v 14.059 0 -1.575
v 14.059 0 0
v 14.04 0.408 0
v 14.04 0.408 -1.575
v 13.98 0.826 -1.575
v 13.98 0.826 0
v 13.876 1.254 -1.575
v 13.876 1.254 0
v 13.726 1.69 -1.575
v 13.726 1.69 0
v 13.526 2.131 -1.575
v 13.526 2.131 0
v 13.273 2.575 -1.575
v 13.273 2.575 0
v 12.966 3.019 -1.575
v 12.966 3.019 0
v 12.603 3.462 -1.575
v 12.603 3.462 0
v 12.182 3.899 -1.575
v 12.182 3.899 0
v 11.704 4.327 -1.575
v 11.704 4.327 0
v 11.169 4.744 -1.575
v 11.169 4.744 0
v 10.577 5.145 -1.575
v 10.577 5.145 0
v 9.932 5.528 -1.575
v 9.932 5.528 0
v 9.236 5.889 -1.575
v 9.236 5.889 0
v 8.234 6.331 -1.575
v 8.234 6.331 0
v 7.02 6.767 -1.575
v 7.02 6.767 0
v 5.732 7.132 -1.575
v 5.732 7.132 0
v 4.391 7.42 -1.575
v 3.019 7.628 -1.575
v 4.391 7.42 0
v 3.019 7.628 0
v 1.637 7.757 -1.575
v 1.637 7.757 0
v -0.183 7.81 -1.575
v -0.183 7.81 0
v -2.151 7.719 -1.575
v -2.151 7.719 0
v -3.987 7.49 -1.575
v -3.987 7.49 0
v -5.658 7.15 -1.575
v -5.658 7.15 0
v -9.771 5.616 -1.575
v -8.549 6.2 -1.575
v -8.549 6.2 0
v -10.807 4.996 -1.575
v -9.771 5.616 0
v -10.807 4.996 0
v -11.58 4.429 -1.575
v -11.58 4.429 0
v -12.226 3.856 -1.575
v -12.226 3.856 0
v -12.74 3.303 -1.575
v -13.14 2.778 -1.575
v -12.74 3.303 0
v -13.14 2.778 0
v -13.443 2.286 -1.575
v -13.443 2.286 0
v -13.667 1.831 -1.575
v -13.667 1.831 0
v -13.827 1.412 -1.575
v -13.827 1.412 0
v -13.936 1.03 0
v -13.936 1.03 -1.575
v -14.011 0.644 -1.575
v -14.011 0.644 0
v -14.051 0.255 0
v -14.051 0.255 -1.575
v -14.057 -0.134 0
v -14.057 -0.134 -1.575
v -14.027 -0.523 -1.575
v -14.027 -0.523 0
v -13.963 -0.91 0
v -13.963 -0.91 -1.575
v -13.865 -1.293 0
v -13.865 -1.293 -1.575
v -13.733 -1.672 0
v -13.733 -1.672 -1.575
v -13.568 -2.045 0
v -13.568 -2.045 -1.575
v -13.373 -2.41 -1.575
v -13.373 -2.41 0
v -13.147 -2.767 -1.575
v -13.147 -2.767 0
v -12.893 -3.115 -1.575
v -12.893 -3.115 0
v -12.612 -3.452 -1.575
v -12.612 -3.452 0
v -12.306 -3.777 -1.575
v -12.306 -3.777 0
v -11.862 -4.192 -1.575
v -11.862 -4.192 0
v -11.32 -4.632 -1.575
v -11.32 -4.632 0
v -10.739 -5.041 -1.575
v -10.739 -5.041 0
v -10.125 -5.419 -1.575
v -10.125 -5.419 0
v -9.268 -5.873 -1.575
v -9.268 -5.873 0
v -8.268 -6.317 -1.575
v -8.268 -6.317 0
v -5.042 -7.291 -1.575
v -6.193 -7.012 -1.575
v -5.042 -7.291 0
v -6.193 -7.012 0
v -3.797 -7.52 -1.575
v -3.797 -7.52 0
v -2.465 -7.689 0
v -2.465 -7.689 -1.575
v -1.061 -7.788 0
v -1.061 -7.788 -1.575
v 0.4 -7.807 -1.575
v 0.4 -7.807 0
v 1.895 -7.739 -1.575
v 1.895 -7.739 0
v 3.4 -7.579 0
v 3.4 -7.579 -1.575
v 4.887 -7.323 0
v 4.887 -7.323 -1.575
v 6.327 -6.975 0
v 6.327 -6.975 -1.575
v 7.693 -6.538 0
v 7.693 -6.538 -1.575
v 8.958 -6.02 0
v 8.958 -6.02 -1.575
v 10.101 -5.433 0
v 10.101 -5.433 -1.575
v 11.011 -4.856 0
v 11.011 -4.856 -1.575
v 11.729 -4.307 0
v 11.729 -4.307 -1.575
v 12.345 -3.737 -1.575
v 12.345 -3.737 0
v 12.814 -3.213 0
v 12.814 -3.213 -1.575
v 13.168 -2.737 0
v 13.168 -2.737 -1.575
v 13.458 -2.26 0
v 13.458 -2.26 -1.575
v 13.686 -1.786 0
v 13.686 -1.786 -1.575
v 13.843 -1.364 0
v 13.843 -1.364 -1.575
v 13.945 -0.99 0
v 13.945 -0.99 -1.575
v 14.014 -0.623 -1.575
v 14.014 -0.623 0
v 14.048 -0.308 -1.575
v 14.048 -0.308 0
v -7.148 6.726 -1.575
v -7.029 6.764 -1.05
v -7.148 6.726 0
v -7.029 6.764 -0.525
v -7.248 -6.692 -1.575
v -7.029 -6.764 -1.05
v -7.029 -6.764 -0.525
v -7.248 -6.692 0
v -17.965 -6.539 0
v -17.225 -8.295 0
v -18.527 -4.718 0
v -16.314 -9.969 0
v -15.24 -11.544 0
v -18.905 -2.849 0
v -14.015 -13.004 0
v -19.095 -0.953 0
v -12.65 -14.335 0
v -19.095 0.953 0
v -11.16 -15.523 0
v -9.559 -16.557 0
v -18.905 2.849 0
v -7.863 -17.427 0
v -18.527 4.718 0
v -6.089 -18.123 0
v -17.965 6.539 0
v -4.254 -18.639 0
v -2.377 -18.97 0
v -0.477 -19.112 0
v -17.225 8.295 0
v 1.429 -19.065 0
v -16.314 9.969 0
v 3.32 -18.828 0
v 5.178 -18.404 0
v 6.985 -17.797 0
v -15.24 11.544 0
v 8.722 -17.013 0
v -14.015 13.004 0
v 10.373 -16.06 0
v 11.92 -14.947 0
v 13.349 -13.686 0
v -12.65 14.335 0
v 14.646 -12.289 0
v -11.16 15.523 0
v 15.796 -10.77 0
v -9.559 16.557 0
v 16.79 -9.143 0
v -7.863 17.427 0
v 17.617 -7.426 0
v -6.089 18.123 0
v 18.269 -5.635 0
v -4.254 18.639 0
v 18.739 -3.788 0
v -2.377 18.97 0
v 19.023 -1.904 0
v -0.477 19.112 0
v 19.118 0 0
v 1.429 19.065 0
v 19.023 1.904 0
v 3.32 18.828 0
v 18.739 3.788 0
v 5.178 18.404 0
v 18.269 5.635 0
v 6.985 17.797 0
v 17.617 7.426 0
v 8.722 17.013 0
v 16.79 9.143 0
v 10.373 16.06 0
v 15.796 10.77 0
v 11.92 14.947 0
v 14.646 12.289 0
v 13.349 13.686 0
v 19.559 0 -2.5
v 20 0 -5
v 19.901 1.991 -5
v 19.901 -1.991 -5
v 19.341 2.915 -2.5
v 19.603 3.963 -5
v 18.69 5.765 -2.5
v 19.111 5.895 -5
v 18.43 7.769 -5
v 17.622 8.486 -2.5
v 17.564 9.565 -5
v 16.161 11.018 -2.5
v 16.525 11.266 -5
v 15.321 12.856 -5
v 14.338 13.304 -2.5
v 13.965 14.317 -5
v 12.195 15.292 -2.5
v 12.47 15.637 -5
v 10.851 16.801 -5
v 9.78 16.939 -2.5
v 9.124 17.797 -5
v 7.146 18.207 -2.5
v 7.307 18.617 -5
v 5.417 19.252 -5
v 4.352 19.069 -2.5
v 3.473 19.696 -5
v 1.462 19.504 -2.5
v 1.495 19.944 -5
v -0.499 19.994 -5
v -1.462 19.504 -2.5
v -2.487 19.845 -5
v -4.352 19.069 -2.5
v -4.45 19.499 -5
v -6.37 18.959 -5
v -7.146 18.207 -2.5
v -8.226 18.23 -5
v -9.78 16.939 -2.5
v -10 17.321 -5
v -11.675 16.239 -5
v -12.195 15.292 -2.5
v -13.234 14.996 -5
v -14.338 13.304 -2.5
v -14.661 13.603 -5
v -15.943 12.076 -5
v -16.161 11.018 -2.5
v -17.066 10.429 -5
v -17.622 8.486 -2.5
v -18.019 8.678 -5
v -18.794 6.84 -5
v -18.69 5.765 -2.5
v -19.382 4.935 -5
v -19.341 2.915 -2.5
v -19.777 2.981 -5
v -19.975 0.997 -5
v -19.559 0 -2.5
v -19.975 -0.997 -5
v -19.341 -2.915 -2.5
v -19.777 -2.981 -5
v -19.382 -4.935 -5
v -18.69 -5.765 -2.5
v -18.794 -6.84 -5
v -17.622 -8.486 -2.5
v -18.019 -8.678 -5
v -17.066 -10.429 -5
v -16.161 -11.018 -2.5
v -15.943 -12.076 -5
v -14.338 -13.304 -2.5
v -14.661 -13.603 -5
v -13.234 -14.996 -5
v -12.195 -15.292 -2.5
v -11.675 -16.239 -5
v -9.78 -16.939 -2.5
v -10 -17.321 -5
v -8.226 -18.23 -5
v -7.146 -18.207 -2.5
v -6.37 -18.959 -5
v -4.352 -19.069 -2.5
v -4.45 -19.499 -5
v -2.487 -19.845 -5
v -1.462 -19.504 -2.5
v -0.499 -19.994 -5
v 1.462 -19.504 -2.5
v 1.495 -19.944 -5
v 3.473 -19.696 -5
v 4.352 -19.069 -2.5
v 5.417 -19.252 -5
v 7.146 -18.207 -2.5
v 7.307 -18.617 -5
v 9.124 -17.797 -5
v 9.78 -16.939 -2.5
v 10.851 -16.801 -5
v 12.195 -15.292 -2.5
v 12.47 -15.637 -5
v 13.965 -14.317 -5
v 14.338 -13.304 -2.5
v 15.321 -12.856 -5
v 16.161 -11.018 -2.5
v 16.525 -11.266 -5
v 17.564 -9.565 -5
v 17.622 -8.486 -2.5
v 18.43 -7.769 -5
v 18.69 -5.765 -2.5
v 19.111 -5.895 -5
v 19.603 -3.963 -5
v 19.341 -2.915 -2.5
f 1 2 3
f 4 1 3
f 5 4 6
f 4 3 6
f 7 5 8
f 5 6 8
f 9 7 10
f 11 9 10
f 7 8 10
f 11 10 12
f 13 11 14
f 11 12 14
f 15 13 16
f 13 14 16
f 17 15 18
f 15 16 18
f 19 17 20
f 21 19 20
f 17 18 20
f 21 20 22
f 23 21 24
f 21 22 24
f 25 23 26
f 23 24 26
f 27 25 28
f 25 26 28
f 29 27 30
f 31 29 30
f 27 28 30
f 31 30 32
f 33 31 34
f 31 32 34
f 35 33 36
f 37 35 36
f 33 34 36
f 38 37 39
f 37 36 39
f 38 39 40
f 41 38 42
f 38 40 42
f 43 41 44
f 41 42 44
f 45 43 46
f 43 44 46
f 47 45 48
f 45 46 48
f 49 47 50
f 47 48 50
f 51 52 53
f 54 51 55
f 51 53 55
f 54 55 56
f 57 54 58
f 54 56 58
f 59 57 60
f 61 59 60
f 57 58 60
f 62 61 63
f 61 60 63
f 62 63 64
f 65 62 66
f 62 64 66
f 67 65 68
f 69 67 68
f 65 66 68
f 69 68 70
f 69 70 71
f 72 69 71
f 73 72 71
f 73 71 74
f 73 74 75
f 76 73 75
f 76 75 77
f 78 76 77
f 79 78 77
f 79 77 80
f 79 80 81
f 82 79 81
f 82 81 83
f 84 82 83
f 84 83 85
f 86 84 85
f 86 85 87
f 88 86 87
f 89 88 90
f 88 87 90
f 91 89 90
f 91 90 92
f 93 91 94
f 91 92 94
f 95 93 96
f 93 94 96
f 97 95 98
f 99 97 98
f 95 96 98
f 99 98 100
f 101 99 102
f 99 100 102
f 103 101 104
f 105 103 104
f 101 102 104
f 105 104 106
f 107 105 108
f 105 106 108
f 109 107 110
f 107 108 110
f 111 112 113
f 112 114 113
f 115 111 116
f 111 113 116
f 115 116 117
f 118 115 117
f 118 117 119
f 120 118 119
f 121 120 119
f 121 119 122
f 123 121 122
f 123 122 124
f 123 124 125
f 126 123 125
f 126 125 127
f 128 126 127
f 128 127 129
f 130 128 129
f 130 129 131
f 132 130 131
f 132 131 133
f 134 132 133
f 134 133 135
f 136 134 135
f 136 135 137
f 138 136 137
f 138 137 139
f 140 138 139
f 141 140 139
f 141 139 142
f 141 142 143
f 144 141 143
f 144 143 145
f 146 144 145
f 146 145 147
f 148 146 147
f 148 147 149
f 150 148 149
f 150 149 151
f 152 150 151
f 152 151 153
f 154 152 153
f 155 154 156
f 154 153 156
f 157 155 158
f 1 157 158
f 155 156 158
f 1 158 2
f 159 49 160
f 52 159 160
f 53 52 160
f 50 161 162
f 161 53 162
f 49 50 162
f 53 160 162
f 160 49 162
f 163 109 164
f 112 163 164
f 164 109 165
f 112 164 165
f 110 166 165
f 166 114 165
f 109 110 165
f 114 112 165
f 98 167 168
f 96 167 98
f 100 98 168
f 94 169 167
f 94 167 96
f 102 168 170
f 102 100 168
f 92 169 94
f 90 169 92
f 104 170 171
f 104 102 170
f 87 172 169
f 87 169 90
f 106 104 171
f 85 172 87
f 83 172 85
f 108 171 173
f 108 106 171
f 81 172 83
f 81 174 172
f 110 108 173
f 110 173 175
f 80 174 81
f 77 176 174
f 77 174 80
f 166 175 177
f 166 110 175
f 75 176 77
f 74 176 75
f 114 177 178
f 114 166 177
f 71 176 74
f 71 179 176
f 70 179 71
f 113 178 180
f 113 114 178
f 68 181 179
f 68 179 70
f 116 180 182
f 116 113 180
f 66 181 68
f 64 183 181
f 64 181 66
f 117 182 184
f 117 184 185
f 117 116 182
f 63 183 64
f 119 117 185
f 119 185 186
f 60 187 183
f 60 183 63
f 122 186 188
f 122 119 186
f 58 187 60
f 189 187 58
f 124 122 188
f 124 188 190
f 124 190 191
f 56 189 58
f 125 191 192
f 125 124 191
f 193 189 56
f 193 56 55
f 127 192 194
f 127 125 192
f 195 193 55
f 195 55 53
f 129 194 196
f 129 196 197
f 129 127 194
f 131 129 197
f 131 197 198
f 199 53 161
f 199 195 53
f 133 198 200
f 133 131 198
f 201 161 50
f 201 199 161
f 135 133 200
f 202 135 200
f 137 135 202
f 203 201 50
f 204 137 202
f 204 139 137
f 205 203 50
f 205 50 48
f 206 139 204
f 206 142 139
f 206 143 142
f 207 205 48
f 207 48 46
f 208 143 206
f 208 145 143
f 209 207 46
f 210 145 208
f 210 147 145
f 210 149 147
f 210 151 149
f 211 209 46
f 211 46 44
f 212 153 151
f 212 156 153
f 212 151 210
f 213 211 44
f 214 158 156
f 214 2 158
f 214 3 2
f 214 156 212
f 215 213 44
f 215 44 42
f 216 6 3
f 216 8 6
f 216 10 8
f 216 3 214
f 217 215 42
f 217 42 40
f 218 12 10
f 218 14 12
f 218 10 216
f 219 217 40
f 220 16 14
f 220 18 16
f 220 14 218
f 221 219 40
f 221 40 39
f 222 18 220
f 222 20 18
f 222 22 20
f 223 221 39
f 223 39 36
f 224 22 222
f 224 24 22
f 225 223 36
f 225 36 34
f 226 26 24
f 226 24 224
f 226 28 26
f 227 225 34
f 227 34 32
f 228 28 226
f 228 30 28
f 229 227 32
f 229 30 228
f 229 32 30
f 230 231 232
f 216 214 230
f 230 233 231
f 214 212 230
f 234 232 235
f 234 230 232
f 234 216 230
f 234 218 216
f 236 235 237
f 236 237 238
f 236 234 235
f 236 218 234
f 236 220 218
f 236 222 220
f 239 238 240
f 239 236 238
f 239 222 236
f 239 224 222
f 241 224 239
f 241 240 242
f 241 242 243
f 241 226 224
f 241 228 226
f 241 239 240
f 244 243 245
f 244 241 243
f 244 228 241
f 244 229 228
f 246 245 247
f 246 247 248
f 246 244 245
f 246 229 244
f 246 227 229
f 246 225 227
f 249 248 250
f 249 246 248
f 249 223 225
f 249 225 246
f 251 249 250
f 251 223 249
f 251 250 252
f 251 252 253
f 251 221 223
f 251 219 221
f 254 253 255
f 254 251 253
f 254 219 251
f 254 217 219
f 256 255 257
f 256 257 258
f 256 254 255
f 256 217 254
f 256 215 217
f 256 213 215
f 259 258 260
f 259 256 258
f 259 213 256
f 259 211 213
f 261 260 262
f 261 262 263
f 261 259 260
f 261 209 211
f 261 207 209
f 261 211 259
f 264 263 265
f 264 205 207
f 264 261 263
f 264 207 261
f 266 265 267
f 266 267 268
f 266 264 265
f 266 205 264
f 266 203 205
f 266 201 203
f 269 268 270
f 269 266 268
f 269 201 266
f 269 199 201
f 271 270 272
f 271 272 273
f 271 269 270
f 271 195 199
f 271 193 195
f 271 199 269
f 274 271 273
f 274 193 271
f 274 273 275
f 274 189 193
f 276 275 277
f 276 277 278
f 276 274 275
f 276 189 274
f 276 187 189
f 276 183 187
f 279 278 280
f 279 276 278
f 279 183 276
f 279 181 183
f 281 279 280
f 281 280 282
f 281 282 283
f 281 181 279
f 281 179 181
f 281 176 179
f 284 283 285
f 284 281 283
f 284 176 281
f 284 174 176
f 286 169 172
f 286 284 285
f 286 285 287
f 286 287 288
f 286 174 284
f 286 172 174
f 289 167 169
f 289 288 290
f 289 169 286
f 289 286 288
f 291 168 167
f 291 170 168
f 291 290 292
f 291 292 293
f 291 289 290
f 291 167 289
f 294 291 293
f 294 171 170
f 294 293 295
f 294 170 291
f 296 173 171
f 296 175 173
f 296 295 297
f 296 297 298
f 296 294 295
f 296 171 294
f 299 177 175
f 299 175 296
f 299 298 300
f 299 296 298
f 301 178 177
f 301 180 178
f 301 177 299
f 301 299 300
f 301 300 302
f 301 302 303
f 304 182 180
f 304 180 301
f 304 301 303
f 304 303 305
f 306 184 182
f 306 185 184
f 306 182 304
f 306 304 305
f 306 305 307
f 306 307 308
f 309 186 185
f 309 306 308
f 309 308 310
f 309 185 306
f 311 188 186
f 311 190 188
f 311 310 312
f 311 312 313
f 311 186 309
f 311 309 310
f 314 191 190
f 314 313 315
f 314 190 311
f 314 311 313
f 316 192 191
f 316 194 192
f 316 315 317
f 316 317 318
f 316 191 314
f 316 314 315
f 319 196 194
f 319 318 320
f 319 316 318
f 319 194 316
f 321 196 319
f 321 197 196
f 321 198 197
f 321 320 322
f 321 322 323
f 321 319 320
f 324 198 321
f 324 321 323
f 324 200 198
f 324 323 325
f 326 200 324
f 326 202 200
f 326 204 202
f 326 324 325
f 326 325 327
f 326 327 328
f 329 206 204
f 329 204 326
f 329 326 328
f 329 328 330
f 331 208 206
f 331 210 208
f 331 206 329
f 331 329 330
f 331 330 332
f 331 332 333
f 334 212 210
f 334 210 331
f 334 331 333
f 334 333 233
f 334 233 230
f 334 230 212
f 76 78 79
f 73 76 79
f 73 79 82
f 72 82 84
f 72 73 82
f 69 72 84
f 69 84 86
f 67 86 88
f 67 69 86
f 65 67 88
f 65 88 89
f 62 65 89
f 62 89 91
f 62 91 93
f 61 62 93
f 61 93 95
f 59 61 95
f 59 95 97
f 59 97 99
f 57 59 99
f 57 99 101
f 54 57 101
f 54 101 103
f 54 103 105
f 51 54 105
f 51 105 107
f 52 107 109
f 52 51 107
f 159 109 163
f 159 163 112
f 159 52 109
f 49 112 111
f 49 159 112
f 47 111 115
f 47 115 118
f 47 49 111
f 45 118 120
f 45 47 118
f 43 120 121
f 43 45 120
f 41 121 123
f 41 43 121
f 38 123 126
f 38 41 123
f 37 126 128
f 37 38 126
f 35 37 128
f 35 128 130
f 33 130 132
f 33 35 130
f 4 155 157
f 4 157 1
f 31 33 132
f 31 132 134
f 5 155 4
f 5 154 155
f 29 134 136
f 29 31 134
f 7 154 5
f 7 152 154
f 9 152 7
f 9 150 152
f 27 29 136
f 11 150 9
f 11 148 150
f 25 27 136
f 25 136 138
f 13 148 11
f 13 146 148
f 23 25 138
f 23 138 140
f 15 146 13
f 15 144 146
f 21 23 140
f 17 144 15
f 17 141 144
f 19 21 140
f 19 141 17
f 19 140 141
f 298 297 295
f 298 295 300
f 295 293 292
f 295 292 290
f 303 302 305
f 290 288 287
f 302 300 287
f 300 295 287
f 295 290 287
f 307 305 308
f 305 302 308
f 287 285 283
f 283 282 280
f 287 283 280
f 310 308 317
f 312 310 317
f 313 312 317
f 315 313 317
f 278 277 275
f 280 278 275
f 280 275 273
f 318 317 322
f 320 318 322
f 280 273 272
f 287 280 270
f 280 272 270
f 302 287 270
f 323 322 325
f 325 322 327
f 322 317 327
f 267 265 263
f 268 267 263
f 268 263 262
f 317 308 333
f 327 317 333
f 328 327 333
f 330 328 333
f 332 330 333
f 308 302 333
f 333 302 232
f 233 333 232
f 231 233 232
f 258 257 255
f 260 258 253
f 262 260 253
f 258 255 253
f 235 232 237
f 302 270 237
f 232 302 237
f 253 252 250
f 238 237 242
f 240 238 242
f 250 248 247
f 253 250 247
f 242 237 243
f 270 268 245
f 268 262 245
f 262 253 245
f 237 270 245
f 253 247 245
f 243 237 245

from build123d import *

# Parameters (mm, degrees)
F0_R     = 20
F1_DEPTH = 5
F2_SIZE2 = 0.881625
F2_SIZE  = 4.99999
F4_DEPTH = 1.5748


# Not quite as in the source:
# - a fillet or chamfer is up to 0.001 mm smaller than in the source, because OpenCascade refuses the exact size


with BuildPart() as f1:
    # F0 (on Top) → F1 (new body)
    with BuildSketch(Plane.XY):
        Circle(F0_R)
    extrude(amount=-F1_DEPTH)

    # F2 (size 5 and 0.8816349035 in the source; OpenCascade refuses exactly that, so slightly less here)
    f2_edges = [f1.edges().sort_by_distance(p)[0] for p in [
        (-20, 0, 0),
    ]]
    f2_side = f1.faces().sort_by_distance((-20, 0, -2.5))[0]
    chamfer(f2_edges, length=F2_SIZE, length2=F2_SIZE2, reference=f2_side)

    # F3 (on face) → F4 (cut)
    with BuildSketch(Plane.XY):
        with BuildLine():
            add(Edge.make_bspline(
                [(14.0589, 0), (14.0589, 13.5281828325), (-7.02945, 6.7640914163), (-28.1178, 0), (-7.02945, -6.7640914163), (14.0589, -13.5281828325), (14.0589, 0)],
                knots=[0, 0, 0, 2.0943951024, 2.0943951024, 4.1887902048, 4.1887902048, 6.2831853072, 6.2831853072, 6.2831853072], degree=2, weights=[1, 0.5, 1, 0.5, 1, 0.5, 1]))
        make_face()
    extrude(amount=-F4_DEPTH, mode=Mode.SUBTRACT)


solid = f1.part
